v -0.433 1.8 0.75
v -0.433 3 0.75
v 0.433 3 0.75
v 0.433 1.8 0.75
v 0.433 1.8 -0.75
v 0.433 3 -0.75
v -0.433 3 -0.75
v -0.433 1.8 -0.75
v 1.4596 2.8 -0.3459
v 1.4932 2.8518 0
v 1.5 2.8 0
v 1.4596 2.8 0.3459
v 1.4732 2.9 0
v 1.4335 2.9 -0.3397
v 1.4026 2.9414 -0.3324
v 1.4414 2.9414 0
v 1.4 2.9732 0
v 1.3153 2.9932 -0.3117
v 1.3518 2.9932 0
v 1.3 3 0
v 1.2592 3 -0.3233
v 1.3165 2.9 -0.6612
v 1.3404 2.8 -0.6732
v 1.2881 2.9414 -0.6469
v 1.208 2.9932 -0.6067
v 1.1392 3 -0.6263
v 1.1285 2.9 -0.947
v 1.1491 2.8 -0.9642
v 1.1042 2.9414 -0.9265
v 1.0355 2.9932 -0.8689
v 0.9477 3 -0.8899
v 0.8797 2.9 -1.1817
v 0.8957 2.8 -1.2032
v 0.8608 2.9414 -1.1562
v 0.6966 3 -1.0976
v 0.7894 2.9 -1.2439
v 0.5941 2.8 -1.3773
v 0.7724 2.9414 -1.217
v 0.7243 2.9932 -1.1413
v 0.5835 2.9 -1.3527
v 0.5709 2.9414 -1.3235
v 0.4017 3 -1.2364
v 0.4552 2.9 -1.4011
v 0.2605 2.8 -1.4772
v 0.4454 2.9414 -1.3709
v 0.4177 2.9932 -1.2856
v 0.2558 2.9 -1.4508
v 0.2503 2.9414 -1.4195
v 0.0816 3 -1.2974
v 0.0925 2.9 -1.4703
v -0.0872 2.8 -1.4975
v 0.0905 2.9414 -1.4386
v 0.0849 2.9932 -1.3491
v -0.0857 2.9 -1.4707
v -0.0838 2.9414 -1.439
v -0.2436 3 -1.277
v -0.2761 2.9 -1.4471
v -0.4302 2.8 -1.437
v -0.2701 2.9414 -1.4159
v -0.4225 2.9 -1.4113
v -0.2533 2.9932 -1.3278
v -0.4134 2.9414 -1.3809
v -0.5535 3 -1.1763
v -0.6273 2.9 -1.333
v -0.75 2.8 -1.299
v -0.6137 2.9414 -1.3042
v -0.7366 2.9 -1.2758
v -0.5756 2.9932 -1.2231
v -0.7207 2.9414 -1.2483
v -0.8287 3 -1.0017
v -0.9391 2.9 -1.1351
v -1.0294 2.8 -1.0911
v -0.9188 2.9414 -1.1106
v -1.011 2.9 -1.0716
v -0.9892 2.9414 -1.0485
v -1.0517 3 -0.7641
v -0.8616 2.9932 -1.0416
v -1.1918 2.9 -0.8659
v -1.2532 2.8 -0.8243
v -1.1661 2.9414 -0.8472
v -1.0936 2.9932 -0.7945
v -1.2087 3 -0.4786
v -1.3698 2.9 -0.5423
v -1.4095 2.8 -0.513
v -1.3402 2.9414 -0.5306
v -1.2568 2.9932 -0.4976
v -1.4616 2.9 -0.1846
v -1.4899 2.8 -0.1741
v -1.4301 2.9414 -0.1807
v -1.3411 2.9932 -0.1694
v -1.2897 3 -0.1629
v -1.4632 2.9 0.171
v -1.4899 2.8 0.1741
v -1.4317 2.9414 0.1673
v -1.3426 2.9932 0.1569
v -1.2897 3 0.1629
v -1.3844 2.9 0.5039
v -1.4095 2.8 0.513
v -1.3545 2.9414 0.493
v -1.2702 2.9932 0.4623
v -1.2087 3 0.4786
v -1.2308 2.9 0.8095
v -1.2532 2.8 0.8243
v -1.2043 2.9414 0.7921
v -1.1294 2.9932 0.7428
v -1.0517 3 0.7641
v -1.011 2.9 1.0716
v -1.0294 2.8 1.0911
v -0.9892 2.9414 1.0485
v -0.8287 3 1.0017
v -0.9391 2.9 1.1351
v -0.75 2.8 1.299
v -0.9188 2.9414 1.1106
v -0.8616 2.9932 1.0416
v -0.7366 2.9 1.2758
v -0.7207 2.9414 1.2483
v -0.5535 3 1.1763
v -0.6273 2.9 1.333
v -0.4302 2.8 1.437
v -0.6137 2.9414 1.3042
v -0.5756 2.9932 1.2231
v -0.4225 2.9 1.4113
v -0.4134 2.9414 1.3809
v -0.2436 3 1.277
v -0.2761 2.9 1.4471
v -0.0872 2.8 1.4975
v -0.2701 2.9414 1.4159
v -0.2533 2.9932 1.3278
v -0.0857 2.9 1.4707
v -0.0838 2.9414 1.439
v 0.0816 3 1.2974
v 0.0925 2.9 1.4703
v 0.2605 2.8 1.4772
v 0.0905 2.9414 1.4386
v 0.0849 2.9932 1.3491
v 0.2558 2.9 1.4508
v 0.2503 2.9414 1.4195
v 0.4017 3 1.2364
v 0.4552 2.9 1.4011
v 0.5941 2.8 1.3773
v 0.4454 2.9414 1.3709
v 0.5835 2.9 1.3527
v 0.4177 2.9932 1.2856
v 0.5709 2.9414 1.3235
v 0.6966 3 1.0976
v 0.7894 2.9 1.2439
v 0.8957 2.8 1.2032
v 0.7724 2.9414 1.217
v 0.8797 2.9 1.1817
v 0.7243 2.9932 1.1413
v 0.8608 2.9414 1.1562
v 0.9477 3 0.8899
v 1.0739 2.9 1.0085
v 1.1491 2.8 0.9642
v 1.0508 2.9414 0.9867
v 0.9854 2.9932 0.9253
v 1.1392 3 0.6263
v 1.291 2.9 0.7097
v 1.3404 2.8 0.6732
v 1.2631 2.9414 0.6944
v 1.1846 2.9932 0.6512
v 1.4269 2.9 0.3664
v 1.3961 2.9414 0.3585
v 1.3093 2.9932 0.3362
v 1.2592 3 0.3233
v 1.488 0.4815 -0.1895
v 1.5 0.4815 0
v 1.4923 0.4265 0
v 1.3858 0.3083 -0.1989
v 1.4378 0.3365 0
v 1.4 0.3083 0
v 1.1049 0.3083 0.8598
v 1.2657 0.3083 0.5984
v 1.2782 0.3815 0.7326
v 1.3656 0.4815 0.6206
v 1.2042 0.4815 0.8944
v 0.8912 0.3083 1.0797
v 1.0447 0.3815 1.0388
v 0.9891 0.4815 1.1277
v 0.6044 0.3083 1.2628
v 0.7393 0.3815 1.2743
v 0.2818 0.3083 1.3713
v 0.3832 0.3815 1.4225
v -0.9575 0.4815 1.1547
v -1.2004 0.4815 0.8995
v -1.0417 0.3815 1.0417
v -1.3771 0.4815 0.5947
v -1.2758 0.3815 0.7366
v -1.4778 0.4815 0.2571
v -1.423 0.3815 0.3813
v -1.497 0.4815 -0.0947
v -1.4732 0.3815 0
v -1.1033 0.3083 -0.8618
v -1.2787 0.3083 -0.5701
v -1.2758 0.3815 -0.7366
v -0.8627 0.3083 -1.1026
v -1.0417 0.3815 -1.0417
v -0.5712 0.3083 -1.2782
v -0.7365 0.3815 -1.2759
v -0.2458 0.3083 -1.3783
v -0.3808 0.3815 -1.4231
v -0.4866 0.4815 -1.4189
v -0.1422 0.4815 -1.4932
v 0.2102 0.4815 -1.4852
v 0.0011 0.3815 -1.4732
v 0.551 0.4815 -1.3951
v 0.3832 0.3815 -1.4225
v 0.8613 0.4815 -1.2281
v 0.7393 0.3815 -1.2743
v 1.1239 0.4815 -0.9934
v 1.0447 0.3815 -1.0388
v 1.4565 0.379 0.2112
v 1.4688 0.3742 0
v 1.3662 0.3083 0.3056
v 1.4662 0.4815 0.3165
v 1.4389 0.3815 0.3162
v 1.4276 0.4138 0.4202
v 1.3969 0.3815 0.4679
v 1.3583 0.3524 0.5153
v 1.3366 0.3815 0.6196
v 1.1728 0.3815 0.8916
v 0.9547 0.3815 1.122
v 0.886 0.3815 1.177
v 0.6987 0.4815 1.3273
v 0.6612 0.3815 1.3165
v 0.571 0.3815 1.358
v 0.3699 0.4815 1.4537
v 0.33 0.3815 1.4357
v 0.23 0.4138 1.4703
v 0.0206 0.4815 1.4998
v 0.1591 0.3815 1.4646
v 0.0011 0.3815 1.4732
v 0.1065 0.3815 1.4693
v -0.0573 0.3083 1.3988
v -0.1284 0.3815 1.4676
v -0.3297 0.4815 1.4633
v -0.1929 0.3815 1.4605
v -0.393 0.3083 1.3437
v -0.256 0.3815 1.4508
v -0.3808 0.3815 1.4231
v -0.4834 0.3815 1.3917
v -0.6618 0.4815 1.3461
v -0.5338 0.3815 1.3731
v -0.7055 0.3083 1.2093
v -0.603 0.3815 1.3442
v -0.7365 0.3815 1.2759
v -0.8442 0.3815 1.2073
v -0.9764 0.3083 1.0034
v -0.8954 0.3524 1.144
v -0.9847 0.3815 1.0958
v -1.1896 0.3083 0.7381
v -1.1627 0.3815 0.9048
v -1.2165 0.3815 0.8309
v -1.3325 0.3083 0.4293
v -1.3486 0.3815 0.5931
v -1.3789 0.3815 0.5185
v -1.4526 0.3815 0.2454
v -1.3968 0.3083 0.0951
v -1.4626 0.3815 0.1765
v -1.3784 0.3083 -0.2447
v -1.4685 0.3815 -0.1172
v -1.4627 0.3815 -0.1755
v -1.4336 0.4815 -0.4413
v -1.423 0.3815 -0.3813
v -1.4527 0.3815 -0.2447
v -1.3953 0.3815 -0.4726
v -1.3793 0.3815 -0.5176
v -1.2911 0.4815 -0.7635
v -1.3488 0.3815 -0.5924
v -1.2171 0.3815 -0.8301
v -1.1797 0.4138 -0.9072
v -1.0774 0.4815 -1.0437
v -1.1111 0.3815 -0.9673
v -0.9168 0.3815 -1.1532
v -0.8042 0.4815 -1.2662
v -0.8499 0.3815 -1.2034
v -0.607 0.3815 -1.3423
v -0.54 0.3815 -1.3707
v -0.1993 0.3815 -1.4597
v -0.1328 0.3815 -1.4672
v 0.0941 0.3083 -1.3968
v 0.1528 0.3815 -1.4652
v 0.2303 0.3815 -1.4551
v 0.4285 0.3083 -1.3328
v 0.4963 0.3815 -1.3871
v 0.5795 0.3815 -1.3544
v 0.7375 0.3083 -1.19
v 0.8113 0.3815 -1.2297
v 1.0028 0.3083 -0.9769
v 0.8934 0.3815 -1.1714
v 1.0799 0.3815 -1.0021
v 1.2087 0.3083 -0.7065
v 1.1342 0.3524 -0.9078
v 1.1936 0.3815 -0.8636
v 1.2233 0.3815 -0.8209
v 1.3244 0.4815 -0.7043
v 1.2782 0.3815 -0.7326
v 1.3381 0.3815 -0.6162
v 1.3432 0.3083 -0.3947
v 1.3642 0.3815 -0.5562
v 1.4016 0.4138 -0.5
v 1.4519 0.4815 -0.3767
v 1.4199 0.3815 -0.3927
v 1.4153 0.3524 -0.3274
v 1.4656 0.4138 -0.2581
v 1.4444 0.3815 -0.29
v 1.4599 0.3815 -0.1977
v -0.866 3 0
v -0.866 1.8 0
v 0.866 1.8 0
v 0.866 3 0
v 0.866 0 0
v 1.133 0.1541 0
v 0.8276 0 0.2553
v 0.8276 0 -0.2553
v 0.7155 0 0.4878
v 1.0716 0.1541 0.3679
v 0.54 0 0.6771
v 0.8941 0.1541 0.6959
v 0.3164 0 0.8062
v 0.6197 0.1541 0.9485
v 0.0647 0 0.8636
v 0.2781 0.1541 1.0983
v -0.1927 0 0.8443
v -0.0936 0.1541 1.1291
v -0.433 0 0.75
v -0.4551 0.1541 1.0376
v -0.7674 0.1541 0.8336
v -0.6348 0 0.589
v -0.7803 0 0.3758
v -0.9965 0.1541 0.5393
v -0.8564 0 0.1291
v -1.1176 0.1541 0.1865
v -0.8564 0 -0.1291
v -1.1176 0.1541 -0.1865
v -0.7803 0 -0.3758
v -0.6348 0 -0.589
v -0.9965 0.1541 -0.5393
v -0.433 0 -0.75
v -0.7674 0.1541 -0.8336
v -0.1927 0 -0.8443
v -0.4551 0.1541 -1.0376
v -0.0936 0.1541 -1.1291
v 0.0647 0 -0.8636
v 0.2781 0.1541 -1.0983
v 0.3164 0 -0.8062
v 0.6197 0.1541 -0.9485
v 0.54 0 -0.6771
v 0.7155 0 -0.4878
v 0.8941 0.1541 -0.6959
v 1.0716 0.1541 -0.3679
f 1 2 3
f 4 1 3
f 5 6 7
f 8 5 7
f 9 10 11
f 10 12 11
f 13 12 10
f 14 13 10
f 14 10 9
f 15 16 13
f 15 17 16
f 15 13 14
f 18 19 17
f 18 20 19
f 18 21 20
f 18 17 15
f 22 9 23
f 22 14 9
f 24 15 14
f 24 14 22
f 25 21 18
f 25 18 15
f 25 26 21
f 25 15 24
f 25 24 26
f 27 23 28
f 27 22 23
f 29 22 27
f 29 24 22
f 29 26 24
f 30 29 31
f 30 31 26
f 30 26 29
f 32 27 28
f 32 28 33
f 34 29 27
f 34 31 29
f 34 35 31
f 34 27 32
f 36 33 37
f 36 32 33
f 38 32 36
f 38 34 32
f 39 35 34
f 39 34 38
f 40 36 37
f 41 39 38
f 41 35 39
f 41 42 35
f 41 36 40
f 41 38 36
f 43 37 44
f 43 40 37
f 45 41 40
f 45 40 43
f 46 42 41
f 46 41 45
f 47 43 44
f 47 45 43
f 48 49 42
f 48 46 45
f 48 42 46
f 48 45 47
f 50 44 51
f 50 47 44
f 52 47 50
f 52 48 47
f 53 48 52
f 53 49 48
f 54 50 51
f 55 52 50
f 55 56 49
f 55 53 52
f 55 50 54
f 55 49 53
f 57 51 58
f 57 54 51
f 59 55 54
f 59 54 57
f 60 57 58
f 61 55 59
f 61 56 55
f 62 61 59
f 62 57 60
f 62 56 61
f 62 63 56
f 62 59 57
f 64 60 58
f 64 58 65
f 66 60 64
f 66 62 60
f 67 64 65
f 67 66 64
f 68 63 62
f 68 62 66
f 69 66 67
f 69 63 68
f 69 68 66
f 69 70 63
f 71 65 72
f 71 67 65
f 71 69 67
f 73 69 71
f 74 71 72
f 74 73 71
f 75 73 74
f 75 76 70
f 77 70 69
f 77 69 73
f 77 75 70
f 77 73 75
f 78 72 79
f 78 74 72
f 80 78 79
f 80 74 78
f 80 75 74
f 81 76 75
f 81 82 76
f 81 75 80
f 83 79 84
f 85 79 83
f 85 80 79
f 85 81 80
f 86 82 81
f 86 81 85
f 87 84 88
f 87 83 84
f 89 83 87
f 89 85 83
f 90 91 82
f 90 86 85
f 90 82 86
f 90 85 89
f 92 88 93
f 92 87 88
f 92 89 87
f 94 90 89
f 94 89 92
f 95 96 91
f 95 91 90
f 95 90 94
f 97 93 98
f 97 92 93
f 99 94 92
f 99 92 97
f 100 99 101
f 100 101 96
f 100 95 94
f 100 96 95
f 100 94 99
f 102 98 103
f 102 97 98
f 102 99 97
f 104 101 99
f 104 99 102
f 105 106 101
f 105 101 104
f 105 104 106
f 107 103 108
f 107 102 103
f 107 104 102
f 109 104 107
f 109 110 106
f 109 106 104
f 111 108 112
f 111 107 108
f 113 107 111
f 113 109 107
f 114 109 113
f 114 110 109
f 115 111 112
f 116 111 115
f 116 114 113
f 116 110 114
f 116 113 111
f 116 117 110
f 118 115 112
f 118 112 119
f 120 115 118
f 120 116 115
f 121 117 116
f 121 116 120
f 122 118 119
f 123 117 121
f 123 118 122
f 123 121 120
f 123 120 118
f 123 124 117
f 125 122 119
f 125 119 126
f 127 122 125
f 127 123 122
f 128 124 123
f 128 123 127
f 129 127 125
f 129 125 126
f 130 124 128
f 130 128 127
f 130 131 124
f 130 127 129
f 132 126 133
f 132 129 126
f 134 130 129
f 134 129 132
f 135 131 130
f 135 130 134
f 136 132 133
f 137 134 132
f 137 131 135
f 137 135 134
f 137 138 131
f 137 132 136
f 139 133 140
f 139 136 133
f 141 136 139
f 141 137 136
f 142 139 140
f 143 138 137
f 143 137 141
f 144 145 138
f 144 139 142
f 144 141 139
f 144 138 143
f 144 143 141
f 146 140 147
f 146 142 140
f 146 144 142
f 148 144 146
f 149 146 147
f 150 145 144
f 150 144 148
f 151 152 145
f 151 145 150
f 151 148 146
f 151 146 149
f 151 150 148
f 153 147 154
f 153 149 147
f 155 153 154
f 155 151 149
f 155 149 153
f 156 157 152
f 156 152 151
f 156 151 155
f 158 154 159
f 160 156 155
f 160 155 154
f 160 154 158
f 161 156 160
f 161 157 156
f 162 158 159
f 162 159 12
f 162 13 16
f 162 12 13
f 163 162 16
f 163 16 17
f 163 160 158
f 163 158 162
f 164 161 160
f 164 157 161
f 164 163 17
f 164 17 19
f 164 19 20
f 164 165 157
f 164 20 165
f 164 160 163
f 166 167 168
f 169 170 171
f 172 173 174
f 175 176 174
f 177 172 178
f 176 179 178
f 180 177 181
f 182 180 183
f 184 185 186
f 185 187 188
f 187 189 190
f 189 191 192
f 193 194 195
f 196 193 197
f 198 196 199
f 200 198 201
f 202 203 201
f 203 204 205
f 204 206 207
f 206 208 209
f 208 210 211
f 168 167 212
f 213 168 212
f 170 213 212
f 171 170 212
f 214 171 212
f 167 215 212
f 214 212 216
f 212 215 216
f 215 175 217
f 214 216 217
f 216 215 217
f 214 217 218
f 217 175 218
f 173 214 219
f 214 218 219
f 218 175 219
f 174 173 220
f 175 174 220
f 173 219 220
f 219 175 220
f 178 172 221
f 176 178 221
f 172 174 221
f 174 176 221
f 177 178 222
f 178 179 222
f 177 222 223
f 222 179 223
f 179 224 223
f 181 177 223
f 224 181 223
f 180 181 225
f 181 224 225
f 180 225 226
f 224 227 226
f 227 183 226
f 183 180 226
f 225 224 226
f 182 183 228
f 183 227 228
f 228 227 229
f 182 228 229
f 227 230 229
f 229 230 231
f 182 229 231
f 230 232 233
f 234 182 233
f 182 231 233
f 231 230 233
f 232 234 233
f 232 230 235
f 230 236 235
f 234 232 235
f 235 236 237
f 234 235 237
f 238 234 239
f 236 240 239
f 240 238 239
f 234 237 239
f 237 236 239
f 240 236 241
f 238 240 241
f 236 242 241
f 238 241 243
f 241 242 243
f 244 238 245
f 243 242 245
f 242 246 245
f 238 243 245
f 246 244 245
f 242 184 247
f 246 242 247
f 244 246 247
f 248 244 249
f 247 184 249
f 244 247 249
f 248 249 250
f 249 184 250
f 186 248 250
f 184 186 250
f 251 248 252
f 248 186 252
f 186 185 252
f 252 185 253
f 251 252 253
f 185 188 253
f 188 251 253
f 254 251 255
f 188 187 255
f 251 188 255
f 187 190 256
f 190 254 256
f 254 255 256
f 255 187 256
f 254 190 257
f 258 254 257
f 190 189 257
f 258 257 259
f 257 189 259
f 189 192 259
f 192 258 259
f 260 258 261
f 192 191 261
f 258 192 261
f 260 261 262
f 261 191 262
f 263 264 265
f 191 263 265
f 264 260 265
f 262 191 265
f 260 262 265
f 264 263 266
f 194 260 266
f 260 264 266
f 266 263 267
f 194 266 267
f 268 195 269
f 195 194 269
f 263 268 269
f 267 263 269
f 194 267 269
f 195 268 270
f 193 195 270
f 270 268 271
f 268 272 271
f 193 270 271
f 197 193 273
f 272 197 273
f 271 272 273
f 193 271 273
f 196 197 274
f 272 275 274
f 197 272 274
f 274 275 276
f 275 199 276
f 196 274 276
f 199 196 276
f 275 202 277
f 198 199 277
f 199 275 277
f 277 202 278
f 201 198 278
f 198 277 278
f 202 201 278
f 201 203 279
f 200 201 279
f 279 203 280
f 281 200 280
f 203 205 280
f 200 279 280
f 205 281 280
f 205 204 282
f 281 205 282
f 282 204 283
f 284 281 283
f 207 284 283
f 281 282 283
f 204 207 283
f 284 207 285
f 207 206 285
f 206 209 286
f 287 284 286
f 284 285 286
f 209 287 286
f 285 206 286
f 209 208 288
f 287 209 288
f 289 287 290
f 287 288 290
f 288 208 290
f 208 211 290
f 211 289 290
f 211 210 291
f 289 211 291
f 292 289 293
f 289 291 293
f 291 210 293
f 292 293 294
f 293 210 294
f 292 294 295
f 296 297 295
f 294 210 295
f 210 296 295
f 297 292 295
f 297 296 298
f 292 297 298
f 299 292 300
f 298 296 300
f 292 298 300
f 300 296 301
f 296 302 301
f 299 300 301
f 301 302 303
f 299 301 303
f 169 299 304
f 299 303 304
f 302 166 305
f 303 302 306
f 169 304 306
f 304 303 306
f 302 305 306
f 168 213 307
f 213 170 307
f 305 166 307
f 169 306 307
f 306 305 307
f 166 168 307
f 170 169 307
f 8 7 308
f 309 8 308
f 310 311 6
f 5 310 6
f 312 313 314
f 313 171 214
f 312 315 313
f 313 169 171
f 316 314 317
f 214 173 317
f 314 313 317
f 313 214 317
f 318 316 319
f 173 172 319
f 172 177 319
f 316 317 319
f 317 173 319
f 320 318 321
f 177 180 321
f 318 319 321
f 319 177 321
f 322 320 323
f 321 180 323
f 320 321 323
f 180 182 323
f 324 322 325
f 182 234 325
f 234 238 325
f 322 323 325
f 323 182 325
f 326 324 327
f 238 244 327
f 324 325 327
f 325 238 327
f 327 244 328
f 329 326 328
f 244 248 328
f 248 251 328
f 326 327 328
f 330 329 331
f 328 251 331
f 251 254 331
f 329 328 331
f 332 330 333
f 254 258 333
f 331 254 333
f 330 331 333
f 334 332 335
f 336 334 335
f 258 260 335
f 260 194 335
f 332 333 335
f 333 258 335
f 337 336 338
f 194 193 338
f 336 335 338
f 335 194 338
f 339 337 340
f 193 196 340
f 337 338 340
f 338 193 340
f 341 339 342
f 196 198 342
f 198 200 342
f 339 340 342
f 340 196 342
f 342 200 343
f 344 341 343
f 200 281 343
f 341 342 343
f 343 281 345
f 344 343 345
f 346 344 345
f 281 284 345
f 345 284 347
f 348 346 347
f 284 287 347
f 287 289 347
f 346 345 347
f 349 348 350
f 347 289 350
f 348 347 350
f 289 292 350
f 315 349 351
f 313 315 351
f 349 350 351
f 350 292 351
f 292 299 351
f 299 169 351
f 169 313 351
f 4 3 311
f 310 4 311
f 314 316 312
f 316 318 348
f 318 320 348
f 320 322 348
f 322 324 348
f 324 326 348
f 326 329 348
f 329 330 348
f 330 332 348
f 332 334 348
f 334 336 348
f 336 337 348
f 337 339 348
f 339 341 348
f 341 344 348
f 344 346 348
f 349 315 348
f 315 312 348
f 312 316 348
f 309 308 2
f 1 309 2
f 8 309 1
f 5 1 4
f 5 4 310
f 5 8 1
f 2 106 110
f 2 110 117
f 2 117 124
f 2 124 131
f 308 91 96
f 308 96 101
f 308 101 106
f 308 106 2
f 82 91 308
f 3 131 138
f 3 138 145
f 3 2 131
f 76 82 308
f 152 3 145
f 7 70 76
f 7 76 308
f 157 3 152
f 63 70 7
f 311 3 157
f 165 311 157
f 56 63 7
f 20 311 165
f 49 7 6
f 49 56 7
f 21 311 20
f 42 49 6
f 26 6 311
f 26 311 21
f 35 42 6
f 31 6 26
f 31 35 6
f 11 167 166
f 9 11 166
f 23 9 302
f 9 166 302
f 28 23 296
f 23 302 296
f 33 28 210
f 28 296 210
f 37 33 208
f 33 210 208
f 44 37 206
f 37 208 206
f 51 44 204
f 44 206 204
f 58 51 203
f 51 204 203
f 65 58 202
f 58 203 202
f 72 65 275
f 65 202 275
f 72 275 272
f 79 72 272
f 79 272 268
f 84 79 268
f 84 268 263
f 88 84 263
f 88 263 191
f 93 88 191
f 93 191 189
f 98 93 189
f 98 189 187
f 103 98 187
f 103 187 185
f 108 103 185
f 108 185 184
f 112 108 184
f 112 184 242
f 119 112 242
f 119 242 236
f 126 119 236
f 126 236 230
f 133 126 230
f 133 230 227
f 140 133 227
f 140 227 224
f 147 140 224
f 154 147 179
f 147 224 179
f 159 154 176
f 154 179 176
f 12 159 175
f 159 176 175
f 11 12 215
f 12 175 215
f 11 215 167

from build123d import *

# Parameters (mm, degrees)
SKETCH_1_R            = 1.5
EXTRUDE_254_DEPTH     = 3
CUT_EXTRUDE_384_DEPTH = 1.2
FILLET_1_R            = 0.2


with BuildPart() as part:
    # 草图1 → Extrude 254 (new body)
    with BuildSketch(Plane(origin=(0, 0, 0), x_dir=(1, 0, 0), z_dir=(0, 1, 0))):
        Circle(SKETCH_1_R)
    extrude(amount=EXTRUDE_254_DEPTH)

    # 草图2 → Cut-Extrude 384 (cut)
    with BuildSketch(Plane(origin=(0, 3, 0), x_dir=(1, 0, 0), z_dir=(0, 1, 0))):
        Polygon((0.866025404, 0), (0.433012702, 0.75), (-0.433012702, 0.75), (-0.866025404, 0), (-0.433012702, -0.75), (0.433012702, -0.75), align=None)
    extrude(amount=-CUT_EXTRUDE_384_DEPTH, mode=Mode.SUBTRACT)

    # 草图3 → 切除-旋转4 (revolve, cut)
    with BuildSketch(Plane.XY):
        Polygon((0.866025404, 0), (1.5, 0.366025404), (1.5, 0), align=None)
    revolve(axis=Axis((0, 3, 0), (0, -1, 0)), mode=Mode.SUBTRACT)

    # 圆角1
    fillet_1_edges = [part.edges().sort_by_distance(p)[0] for p in [
        (-1.5, 0.366025404, 0),
        (-1.5, 3, 0),
    ]]
    fillet(fillet_1_edges, radius=FILLET_1_R)


solid = part.part
